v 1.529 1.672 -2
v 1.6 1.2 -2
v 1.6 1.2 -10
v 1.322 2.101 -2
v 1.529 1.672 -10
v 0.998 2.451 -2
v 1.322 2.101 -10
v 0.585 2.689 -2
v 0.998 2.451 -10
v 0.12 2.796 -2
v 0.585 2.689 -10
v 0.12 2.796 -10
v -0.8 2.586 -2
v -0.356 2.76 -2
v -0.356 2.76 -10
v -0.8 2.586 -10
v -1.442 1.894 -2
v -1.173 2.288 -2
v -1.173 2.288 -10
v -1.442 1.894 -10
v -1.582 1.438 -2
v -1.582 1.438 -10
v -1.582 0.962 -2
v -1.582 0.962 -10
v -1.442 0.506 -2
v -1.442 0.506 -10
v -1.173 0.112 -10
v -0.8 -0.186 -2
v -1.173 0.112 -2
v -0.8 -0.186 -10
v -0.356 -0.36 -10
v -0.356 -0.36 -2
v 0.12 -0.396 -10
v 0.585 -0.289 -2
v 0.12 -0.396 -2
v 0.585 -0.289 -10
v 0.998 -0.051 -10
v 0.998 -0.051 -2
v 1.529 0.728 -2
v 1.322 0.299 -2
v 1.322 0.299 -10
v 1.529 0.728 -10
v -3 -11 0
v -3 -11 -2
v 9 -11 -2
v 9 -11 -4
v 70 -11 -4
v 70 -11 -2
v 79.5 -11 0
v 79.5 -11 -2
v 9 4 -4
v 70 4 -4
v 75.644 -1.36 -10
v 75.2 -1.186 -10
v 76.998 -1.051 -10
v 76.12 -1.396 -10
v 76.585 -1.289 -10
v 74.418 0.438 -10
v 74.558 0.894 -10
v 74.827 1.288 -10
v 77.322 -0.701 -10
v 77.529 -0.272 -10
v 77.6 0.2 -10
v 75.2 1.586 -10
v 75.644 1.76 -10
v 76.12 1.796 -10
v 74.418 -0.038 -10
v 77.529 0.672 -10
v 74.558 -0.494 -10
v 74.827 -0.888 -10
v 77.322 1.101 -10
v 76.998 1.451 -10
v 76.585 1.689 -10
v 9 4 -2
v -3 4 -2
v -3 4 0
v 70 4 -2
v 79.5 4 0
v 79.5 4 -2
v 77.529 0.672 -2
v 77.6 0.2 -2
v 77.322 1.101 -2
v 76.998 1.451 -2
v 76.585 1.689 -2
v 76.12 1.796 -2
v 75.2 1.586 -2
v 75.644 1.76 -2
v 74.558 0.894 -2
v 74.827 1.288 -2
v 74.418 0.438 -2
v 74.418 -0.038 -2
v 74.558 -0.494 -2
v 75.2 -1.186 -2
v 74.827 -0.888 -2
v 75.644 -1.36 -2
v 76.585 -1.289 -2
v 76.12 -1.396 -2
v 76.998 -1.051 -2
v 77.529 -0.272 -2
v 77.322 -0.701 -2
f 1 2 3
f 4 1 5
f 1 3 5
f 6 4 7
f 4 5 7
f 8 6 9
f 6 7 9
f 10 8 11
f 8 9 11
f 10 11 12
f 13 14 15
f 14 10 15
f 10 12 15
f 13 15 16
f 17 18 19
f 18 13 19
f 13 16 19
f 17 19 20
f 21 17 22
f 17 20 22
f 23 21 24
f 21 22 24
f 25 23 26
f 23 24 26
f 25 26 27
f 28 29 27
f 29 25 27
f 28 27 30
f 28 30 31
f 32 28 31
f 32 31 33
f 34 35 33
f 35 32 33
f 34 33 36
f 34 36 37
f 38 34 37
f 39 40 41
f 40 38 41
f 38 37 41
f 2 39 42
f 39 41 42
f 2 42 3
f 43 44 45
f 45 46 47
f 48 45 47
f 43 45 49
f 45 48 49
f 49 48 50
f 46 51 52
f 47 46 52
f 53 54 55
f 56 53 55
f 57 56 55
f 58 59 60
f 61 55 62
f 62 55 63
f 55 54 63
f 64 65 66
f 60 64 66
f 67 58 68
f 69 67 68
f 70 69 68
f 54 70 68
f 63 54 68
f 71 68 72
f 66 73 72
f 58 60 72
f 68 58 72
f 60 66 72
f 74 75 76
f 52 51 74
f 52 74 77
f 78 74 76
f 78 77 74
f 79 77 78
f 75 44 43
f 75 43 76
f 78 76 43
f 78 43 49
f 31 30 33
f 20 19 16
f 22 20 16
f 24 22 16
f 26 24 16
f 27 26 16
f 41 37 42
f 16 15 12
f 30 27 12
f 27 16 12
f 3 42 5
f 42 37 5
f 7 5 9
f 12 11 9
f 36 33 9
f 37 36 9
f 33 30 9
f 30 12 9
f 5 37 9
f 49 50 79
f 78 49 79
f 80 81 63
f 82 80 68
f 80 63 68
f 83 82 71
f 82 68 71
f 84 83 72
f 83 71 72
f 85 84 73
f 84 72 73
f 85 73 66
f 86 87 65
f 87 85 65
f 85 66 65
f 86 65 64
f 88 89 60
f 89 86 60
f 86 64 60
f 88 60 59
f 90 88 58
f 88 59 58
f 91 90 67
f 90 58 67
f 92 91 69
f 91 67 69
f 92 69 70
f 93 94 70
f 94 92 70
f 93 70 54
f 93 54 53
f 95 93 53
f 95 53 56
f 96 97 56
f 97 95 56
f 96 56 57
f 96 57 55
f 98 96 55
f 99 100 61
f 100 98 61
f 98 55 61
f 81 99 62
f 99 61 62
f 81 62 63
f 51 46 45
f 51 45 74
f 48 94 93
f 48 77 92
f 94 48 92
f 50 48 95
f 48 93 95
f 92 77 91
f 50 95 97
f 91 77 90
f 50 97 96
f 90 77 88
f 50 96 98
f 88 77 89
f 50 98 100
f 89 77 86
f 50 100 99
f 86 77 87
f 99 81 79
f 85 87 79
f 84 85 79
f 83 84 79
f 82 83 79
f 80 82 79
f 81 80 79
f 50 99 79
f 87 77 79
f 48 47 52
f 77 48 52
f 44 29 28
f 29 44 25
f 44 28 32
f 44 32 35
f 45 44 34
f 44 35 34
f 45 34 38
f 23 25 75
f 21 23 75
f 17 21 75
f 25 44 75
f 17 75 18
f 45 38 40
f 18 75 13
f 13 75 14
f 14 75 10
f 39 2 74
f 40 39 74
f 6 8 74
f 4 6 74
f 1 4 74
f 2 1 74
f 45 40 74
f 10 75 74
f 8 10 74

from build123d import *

# Parameters (mm, degrees)
CYLINDER_R        = 1.6
CYLINDER_DEPTH    = 10
BOX001_W          = 61
BOX001_H          = 15
BOX001_DEPTH      = 2
BOX_W             = 82.5
BOX_H             = 15
BOX_DEPTH         = 2
CYLINDER003_R     = 1.6
CYLINDER003_DEPTH = 10


with BuildPart() as taladro1:
    # Cylinder → Cylinder (new body)
    with BuildSketch(Plane(origin=(0, 1.2, -10), x_dir=(1, 0, 0), z_dir=(0, 0, 1))):
        Circle(CYLINDER_R)
    extrude(amount=CYLINDER_DEPTH)


with BuildPart() as perfora_2mm_centro:
    # Box001 → Box001 (new body)
    with BuildSketch(Plane(origin=(12, 0, -2), x_dir=(1, 0, 0), z_dir=(0, 0, 1))):
        with Locations((30.5, 7.5)):
            Rectangle(BOX001_W, BOX001_H)
    extrude(amount=BOX001_DEPTH)


with BuildPart() as fusion001:
    # Box → Box (new body)
    with BuildSketch(Plane.XY):
        with Locations((41.25, 7.5)):
            Rectangle(BOX_W, BOX_H)
    extrude(amount=BOX_DEPTH)

    # Fusion: union perfora_2mm_centro
    add(perfora_2mm_centro.part)


with BuildPart() as fusion001_1:
    # Fusion placement: moved
    add(fusion001.part.moved(Location((-3, -11, -2))))

    # Fusion001: union taladro1
    add(taladro1.part)


with BuildPart() as fusion006:
    # Cylinder003 → Cylinder003 (new body)
    with BuildSketch(Plane(origin=(76, 0.2, -10), x_dir=(1, 0, 0), z_dir=(0, 0, 1))):
        Circle(CYLINDER003_R)
    extrude(amount=CYLINDER003_DEPTH)

    # Fusion006: union Fusion001
    add(fusion001_1.part)


solid = fusion006.part
